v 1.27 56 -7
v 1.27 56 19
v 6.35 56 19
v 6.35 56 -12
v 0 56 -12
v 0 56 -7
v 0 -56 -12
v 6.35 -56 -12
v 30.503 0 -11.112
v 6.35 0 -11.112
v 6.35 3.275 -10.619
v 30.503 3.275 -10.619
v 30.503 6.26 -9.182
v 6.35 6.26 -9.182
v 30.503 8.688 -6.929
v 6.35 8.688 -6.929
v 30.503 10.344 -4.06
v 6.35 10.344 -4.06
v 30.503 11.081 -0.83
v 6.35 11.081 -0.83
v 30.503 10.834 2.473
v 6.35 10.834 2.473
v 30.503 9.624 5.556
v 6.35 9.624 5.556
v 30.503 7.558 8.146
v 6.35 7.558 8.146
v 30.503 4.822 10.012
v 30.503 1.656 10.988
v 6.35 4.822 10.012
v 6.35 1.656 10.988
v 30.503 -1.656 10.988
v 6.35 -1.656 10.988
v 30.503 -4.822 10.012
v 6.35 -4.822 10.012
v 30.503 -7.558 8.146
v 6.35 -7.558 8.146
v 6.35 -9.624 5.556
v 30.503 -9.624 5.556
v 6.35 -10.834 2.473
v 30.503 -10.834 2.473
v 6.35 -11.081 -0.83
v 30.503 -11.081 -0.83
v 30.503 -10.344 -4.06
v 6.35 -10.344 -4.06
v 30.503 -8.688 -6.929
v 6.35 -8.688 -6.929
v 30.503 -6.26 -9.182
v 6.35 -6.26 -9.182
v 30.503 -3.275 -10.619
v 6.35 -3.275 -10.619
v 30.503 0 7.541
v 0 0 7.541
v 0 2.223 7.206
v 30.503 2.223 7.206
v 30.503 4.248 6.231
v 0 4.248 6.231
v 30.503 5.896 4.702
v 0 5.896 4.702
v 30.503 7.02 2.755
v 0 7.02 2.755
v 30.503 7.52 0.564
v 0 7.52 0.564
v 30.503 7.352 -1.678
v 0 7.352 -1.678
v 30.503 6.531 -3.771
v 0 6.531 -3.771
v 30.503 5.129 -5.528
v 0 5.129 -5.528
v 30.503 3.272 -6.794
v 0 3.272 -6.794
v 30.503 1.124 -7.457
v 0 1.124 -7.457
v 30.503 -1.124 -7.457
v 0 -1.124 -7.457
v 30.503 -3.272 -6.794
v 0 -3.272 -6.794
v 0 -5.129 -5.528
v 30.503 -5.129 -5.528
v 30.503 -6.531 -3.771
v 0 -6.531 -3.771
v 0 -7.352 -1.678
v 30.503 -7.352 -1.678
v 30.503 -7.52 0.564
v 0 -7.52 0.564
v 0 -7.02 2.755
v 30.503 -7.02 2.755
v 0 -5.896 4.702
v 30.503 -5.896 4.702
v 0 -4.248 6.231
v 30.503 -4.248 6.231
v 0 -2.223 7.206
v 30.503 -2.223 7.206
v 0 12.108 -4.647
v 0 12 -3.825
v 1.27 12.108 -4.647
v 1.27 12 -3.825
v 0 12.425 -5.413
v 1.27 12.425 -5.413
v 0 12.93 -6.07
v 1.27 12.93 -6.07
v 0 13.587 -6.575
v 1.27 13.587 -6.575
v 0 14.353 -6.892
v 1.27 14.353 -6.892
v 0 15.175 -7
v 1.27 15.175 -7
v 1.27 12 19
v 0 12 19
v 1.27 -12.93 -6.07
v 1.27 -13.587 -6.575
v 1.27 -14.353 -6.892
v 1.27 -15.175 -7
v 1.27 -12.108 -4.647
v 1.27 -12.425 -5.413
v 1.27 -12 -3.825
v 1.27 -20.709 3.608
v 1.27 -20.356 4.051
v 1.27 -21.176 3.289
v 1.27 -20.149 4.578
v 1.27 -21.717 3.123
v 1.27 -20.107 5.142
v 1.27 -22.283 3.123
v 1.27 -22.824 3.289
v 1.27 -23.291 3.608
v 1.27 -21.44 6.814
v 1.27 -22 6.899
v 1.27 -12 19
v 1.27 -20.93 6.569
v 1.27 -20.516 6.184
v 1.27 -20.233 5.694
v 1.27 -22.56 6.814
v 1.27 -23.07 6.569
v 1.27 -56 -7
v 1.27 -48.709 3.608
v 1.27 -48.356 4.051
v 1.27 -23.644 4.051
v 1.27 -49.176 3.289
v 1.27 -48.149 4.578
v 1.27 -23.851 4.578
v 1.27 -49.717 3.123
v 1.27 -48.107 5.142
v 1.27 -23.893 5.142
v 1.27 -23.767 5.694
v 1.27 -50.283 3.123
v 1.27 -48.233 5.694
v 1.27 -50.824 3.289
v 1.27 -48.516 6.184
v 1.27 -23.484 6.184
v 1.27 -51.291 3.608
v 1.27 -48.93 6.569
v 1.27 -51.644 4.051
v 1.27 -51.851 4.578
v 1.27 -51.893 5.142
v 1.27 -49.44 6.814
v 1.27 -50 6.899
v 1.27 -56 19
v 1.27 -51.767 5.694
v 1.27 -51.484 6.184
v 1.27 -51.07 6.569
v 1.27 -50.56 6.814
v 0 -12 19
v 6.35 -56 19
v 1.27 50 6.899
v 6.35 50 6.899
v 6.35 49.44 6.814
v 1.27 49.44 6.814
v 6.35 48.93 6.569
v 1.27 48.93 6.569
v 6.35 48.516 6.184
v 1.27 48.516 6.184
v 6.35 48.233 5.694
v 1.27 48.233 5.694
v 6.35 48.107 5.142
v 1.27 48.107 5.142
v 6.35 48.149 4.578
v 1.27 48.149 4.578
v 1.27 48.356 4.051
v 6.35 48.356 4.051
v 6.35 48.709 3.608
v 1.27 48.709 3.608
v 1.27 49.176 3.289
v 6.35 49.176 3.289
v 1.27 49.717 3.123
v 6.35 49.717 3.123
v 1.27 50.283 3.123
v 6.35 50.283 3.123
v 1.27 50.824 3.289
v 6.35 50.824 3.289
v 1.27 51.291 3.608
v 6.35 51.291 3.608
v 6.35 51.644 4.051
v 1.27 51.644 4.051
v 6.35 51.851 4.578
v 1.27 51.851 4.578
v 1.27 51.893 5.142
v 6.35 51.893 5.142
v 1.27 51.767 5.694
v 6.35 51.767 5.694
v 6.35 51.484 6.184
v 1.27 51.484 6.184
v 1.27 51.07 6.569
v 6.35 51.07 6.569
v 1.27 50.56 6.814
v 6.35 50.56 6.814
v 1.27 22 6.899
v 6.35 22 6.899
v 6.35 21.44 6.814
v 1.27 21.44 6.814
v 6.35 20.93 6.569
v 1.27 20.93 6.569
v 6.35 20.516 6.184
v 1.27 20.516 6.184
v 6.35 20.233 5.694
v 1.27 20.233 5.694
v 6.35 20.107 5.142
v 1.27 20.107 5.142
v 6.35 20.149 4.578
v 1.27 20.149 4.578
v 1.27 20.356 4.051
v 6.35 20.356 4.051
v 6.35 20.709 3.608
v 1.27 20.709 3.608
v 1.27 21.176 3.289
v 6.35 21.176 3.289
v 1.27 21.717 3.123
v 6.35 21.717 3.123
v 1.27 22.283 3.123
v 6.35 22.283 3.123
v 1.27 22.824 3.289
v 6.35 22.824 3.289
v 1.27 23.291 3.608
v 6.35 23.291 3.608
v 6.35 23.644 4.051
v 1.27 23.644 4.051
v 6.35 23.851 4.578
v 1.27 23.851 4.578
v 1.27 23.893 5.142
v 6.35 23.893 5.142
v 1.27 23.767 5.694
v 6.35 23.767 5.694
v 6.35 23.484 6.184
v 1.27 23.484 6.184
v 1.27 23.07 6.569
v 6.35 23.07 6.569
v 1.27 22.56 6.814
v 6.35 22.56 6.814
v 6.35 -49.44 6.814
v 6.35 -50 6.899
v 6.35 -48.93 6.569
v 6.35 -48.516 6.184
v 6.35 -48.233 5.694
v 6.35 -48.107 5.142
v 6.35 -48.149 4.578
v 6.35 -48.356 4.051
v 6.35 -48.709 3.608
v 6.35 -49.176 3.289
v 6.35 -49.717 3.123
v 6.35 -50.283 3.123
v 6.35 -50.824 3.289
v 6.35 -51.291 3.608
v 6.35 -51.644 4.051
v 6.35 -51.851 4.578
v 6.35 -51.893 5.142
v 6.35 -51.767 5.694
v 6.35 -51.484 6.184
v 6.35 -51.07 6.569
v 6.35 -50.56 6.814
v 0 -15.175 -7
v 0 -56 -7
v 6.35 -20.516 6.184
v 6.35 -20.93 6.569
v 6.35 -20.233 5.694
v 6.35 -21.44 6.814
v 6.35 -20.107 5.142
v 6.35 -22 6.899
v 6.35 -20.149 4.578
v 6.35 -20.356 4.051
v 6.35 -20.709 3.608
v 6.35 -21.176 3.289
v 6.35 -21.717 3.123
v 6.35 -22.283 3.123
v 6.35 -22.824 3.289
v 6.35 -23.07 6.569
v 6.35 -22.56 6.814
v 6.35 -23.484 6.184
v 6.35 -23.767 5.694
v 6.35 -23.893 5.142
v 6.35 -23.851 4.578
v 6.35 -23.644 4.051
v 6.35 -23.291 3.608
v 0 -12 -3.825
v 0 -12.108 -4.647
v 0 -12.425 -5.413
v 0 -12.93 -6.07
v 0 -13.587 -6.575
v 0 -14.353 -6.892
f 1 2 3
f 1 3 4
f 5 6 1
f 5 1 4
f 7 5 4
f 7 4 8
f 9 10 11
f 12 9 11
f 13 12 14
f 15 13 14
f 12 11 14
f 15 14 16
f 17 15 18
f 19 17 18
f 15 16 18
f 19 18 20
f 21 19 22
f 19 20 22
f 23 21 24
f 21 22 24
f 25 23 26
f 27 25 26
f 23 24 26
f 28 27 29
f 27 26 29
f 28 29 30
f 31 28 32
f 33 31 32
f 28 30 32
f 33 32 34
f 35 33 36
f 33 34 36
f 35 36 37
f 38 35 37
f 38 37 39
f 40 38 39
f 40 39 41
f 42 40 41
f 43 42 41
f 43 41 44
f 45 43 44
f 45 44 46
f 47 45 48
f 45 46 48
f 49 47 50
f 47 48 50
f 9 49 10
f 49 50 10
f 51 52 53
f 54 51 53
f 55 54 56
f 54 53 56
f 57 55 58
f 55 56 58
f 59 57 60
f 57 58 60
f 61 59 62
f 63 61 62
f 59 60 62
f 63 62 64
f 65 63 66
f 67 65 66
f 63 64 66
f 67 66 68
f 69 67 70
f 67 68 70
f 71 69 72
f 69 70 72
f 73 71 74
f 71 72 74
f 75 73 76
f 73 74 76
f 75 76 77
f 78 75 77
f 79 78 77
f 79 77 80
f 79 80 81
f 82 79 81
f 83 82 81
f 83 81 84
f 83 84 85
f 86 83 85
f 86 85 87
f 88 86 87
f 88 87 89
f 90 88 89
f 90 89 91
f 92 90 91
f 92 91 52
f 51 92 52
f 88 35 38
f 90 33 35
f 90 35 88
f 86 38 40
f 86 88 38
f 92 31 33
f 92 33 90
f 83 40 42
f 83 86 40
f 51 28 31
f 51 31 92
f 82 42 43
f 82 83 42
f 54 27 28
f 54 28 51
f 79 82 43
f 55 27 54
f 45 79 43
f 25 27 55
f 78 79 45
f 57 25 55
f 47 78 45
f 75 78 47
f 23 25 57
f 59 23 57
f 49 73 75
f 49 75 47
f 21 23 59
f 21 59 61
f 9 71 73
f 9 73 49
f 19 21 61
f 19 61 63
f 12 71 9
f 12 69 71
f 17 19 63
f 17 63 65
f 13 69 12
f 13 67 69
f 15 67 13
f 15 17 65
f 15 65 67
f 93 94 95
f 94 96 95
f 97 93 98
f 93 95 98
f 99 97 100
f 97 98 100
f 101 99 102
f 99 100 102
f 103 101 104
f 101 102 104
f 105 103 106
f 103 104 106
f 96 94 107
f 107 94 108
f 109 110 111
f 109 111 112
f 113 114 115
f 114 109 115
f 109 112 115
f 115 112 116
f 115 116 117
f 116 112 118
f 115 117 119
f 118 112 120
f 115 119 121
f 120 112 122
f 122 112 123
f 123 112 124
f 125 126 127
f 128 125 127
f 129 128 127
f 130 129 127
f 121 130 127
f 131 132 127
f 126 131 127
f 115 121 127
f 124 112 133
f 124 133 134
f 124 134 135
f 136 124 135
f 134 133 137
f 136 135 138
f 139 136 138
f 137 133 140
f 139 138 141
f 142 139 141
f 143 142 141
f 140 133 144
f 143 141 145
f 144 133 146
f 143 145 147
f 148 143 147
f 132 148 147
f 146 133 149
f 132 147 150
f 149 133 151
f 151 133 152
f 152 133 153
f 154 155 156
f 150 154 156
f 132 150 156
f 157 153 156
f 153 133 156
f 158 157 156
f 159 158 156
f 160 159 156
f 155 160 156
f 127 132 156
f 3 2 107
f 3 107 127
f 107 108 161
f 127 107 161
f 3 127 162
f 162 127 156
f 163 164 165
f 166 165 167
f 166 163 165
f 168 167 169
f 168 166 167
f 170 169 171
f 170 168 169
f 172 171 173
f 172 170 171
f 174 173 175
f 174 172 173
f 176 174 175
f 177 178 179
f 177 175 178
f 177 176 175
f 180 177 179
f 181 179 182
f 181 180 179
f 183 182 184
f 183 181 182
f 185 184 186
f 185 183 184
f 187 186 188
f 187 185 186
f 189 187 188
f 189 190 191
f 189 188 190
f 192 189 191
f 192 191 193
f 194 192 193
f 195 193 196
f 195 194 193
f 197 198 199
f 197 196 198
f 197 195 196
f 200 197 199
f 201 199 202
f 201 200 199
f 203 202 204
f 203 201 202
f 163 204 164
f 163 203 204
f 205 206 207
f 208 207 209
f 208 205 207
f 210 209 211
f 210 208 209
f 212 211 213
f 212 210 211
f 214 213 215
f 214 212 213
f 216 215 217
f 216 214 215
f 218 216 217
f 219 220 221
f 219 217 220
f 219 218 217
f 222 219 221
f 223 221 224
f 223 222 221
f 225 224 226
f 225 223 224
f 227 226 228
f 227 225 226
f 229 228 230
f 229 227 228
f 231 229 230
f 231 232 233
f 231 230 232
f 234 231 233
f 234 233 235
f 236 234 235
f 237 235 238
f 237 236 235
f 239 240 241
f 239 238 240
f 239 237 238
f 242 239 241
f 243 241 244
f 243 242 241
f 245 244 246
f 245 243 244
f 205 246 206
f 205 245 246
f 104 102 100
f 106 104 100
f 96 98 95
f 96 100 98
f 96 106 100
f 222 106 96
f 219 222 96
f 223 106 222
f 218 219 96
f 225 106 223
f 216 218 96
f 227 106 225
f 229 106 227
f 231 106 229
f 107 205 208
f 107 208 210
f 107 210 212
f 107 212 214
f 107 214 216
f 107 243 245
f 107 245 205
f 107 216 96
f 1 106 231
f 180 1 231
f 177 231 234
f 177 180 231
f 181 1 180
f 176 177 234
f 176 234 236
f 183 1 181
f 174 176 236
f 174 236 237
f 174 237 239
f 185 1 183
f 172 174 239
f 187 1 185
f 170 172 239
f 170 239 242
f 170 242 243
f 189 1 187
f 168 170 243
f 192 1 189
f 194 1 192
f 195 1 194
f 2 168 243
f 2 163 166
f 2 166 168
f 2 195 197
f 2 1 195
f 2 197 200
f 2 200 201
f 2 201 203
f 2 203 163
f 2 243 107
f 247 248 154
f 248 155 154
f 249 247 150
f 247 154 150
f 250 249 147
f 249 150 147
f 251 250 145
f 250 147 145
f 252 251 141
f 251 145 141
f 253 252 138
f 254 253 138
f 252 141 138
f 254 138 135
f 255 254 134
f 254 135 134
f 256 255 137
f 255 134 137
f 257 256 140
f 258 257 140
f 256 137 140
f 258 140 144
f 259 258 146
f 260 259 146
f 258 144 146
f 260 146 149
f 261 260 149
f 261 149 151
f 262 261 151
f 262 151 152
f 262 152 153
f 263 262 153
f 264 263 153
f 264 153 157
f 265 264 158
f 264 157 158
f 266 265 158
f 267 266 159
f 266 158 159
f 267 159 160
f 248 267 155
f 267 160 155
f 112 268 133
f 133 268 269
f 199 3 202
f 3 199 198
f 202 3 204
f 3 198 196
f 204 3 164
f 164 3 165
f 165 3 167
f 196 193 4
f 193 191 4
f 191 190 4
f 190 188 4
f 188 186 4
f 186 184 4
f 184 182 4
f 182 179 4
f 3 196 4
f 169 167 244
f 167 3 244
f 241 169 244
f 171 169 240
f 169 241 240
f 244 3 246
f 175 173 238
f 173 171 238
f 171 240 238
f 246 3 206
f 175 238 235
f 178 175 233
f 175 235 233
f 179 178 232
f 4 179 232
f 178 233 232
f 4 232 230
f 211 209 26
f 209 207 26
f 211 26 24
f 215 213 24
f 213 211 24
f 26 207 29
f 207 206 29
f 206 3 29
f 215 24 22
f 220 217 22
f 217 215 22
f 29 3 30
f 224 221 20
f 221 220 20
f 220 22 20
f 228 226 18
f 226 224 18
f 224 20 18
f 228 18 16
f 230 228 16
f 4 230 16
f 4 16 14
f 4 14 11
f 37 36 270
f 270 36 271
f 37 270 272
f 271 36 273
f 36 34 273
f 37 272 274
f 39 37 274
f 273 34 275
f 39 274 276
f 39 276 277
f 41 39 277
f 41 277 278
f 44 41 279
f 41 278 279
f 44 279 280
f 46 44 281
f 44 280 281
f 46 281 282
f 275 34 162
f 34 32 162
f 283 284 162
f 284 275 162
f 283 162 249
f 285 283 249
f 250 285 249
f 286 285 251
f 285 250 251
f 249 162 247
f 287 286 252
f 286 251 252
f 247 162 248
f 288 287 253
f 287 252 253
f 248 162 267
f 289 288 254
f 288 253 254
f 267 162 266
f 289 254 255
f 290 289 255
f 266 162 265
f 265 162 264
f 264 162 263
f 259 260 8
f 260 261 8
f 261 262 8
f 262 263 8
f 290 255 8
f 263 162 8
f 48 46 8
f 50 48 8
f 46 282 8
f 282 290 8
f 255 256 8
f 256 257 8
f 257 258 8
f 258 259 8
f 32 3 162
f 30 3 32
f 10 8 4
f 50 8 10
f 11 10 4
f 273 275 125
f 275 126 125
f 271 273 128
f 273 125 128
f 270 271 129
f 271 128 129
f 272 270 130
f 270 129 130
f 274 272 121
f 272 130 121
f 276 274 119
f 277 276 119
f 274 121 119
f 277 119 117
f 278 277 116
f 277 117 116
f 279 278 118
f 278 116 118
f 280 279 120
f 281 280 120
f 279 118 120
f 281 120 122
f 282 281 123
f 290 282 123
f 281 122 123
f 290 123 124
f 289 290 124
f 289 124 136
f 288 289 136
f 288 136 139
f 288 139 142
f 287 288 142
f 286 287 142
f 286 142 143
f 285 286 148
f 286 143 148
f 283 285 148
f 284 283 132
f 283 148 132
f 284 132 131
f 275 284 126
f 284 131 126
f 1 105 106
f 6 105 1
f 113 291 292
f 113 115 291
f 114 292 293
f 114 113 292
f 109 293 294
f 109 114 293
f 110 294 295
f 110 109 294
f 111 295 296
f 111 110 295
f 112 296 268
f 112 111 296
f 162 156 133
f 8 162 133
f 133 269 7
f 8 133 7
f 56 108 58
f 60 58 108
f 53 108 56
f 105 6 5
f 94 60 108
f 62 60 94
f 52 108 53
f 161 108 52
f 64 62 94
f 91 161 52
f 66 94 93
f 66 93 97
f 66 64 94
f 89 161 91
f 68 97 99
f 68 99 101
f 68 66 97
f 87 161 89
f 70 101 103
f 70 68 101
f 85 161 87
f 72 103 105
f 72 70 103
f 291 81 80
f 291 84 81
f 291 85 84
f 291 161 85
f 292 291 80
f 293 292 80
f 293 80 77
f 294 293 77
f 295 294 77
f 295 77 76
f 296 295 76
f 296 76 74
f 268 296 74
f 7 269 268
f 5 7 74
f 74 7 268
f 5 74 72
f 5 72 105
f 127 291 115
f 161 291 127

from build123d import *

# Parameters (mm, degrees)
SKETCH1_W                       = 31
SKETCH1_H                       = 56
BOSS_EXTRUDE1_DEPTH             = 6.35
SKETCH2_R                       = 11.1125
BOSS_EXTRUDE2_DEPTH             = 24.15253802
SKETCH3_R                       = 7.54126
CUT_EXTRUDE1_DEPTH              = 31.50253802
SKETCH4_W                       = 26
SKETCH4_H                       = 44
CUT_EXTRUDE2_DEPTH              = 1.27
FILLET1_R                       = 3.175
FILLET1_OF_MIRROR2_R            = 3.175
F_10_24_TAPPED_HOLE1_AT_2_COUNT = 2
F_10_24_TAPPED_HOLE1_AT_2_PITCH = 28


with BuildPart() as part:
    # Sketch1 → Boss-Extrude1 (new body)
    with BuildSketch(Plane(origin=(0, 0, 0), x_dir=(0, 0, -1), z_dir=(1, 0, 0))):
        with Locations((-3.5, 28)):
            Rectangle(SKETCH1_W, SKETCH1_H)
    boss_extrude1 = extrude(amount=BOSS_EXTRUDE1_DEPTH)

    # Mirror1: Boss-Extrude1 across plane
    add(boss_extrude1.mirror(Plane.ZX))

    # Sketch2 → Boss-Extrude2 (add)
    with BuildSketch(Plane(origin=(6.35, 0, 0), x_dir=(0, 0, -1), z_dir=(1, 0, 0))):
        Circle(SKETCH2_R)
    extrude(amount=BOSS_EXTRUDE2_DEPTH)

    # Sketch3 → Cut-Extrude1 (cut, through all)
    with BuildSketch(Plane.ZY):
        Circle(SKETCH3_R)
    extrude(amount=-CUT_EXTRUDE1_DEPTH, mode=Mode.SUBTRACT)

    # Sketch4 → Cut-Extrude2 (cut)
    with BuildSketch(Plane.ZY):
        with Locations((6, 34)):
            Rectangle(SKETCH4_W, SKETCH4_H)
    cut_extrude2 = extrude(amount=-CUT_EXTRUDE2_DEPTH, mode=Mode.SUBTRACT)

    # Fillet1
    fillet1_edges = [part.edges().sort_by_distance(p)[0] for p in [
        (0.635, 12, -7),
    ]]
    fillet(fillet1_edges, radius=FILLET1_R)

    # Mirror2: Cut-Extrude2 across plane
    add(cut_extrude2.mirror(Plane.ZX), mode=Mode.SUBTRACT)

    # Fillet1 of Mirror2
    fillet1_of_mirror2_edges = [part.edges().sort_by_distance(p)[0] for p in [
        (0.635, -12, -7),
    ]]
    fillet(fillet1_of_mirror2_edges, radius=FILLET1_OF_MIRROR2_R)

    # Sketch5 → #10-24 Tapped Hole1 (revolve, cut)
    with BuildSketch(Plane(origin=(1.27, 50, 5), x_dir=(0, 0, 1), z_dir=(0, 1, 0))):
        Polygon((0, 0), (0, 16.090824014), (1.89865, 14.95), (1.89865, 0), align=None)
    f_10_24_tapped_hole1 = revolve(axis=Axis((-5.08, 50, 5), (1, 0, 0)), mode=Mode.SUBTRACT)

    # #10-24 Tapped Hole1 at 2: #10-24 Tapped Hole1 ×2
    with Locations(*[(0, -i * F_10_24_TAPPED_HOLE1_AT_2_PITCH, 0) for i in range(1, F_10_24_TAPPED_HOLE1_AT_2_COUNT)]):
        add(f_10_24_tapped_hole1, mode=Mode.SUBTRACT)

    # Mirror3: #10-24 Tapped Hole1 across plane
    add(f_10_24_tapped_hole1.mirror(Plane.ZX), mode=Mode.SUBTRACT)

    # Mirror3 copy 1 sketch → Mirror3 copy 1 (revolve, cut)
    with BuildSketch(Plane(origin=(1.27, -22, 5), x_dir=(0, 0, 1), z_dir=(0, -1, 0))):
        Polygon((0, 0), (0, -16.090824014), (1.89865, -14.95), (1.89865, 0), align=None)
    revolve(axis=Axis((-5.08, -22, 5), (-1, 0, 0)), mode=Mode.SUBTRACT)


solid = part.part
